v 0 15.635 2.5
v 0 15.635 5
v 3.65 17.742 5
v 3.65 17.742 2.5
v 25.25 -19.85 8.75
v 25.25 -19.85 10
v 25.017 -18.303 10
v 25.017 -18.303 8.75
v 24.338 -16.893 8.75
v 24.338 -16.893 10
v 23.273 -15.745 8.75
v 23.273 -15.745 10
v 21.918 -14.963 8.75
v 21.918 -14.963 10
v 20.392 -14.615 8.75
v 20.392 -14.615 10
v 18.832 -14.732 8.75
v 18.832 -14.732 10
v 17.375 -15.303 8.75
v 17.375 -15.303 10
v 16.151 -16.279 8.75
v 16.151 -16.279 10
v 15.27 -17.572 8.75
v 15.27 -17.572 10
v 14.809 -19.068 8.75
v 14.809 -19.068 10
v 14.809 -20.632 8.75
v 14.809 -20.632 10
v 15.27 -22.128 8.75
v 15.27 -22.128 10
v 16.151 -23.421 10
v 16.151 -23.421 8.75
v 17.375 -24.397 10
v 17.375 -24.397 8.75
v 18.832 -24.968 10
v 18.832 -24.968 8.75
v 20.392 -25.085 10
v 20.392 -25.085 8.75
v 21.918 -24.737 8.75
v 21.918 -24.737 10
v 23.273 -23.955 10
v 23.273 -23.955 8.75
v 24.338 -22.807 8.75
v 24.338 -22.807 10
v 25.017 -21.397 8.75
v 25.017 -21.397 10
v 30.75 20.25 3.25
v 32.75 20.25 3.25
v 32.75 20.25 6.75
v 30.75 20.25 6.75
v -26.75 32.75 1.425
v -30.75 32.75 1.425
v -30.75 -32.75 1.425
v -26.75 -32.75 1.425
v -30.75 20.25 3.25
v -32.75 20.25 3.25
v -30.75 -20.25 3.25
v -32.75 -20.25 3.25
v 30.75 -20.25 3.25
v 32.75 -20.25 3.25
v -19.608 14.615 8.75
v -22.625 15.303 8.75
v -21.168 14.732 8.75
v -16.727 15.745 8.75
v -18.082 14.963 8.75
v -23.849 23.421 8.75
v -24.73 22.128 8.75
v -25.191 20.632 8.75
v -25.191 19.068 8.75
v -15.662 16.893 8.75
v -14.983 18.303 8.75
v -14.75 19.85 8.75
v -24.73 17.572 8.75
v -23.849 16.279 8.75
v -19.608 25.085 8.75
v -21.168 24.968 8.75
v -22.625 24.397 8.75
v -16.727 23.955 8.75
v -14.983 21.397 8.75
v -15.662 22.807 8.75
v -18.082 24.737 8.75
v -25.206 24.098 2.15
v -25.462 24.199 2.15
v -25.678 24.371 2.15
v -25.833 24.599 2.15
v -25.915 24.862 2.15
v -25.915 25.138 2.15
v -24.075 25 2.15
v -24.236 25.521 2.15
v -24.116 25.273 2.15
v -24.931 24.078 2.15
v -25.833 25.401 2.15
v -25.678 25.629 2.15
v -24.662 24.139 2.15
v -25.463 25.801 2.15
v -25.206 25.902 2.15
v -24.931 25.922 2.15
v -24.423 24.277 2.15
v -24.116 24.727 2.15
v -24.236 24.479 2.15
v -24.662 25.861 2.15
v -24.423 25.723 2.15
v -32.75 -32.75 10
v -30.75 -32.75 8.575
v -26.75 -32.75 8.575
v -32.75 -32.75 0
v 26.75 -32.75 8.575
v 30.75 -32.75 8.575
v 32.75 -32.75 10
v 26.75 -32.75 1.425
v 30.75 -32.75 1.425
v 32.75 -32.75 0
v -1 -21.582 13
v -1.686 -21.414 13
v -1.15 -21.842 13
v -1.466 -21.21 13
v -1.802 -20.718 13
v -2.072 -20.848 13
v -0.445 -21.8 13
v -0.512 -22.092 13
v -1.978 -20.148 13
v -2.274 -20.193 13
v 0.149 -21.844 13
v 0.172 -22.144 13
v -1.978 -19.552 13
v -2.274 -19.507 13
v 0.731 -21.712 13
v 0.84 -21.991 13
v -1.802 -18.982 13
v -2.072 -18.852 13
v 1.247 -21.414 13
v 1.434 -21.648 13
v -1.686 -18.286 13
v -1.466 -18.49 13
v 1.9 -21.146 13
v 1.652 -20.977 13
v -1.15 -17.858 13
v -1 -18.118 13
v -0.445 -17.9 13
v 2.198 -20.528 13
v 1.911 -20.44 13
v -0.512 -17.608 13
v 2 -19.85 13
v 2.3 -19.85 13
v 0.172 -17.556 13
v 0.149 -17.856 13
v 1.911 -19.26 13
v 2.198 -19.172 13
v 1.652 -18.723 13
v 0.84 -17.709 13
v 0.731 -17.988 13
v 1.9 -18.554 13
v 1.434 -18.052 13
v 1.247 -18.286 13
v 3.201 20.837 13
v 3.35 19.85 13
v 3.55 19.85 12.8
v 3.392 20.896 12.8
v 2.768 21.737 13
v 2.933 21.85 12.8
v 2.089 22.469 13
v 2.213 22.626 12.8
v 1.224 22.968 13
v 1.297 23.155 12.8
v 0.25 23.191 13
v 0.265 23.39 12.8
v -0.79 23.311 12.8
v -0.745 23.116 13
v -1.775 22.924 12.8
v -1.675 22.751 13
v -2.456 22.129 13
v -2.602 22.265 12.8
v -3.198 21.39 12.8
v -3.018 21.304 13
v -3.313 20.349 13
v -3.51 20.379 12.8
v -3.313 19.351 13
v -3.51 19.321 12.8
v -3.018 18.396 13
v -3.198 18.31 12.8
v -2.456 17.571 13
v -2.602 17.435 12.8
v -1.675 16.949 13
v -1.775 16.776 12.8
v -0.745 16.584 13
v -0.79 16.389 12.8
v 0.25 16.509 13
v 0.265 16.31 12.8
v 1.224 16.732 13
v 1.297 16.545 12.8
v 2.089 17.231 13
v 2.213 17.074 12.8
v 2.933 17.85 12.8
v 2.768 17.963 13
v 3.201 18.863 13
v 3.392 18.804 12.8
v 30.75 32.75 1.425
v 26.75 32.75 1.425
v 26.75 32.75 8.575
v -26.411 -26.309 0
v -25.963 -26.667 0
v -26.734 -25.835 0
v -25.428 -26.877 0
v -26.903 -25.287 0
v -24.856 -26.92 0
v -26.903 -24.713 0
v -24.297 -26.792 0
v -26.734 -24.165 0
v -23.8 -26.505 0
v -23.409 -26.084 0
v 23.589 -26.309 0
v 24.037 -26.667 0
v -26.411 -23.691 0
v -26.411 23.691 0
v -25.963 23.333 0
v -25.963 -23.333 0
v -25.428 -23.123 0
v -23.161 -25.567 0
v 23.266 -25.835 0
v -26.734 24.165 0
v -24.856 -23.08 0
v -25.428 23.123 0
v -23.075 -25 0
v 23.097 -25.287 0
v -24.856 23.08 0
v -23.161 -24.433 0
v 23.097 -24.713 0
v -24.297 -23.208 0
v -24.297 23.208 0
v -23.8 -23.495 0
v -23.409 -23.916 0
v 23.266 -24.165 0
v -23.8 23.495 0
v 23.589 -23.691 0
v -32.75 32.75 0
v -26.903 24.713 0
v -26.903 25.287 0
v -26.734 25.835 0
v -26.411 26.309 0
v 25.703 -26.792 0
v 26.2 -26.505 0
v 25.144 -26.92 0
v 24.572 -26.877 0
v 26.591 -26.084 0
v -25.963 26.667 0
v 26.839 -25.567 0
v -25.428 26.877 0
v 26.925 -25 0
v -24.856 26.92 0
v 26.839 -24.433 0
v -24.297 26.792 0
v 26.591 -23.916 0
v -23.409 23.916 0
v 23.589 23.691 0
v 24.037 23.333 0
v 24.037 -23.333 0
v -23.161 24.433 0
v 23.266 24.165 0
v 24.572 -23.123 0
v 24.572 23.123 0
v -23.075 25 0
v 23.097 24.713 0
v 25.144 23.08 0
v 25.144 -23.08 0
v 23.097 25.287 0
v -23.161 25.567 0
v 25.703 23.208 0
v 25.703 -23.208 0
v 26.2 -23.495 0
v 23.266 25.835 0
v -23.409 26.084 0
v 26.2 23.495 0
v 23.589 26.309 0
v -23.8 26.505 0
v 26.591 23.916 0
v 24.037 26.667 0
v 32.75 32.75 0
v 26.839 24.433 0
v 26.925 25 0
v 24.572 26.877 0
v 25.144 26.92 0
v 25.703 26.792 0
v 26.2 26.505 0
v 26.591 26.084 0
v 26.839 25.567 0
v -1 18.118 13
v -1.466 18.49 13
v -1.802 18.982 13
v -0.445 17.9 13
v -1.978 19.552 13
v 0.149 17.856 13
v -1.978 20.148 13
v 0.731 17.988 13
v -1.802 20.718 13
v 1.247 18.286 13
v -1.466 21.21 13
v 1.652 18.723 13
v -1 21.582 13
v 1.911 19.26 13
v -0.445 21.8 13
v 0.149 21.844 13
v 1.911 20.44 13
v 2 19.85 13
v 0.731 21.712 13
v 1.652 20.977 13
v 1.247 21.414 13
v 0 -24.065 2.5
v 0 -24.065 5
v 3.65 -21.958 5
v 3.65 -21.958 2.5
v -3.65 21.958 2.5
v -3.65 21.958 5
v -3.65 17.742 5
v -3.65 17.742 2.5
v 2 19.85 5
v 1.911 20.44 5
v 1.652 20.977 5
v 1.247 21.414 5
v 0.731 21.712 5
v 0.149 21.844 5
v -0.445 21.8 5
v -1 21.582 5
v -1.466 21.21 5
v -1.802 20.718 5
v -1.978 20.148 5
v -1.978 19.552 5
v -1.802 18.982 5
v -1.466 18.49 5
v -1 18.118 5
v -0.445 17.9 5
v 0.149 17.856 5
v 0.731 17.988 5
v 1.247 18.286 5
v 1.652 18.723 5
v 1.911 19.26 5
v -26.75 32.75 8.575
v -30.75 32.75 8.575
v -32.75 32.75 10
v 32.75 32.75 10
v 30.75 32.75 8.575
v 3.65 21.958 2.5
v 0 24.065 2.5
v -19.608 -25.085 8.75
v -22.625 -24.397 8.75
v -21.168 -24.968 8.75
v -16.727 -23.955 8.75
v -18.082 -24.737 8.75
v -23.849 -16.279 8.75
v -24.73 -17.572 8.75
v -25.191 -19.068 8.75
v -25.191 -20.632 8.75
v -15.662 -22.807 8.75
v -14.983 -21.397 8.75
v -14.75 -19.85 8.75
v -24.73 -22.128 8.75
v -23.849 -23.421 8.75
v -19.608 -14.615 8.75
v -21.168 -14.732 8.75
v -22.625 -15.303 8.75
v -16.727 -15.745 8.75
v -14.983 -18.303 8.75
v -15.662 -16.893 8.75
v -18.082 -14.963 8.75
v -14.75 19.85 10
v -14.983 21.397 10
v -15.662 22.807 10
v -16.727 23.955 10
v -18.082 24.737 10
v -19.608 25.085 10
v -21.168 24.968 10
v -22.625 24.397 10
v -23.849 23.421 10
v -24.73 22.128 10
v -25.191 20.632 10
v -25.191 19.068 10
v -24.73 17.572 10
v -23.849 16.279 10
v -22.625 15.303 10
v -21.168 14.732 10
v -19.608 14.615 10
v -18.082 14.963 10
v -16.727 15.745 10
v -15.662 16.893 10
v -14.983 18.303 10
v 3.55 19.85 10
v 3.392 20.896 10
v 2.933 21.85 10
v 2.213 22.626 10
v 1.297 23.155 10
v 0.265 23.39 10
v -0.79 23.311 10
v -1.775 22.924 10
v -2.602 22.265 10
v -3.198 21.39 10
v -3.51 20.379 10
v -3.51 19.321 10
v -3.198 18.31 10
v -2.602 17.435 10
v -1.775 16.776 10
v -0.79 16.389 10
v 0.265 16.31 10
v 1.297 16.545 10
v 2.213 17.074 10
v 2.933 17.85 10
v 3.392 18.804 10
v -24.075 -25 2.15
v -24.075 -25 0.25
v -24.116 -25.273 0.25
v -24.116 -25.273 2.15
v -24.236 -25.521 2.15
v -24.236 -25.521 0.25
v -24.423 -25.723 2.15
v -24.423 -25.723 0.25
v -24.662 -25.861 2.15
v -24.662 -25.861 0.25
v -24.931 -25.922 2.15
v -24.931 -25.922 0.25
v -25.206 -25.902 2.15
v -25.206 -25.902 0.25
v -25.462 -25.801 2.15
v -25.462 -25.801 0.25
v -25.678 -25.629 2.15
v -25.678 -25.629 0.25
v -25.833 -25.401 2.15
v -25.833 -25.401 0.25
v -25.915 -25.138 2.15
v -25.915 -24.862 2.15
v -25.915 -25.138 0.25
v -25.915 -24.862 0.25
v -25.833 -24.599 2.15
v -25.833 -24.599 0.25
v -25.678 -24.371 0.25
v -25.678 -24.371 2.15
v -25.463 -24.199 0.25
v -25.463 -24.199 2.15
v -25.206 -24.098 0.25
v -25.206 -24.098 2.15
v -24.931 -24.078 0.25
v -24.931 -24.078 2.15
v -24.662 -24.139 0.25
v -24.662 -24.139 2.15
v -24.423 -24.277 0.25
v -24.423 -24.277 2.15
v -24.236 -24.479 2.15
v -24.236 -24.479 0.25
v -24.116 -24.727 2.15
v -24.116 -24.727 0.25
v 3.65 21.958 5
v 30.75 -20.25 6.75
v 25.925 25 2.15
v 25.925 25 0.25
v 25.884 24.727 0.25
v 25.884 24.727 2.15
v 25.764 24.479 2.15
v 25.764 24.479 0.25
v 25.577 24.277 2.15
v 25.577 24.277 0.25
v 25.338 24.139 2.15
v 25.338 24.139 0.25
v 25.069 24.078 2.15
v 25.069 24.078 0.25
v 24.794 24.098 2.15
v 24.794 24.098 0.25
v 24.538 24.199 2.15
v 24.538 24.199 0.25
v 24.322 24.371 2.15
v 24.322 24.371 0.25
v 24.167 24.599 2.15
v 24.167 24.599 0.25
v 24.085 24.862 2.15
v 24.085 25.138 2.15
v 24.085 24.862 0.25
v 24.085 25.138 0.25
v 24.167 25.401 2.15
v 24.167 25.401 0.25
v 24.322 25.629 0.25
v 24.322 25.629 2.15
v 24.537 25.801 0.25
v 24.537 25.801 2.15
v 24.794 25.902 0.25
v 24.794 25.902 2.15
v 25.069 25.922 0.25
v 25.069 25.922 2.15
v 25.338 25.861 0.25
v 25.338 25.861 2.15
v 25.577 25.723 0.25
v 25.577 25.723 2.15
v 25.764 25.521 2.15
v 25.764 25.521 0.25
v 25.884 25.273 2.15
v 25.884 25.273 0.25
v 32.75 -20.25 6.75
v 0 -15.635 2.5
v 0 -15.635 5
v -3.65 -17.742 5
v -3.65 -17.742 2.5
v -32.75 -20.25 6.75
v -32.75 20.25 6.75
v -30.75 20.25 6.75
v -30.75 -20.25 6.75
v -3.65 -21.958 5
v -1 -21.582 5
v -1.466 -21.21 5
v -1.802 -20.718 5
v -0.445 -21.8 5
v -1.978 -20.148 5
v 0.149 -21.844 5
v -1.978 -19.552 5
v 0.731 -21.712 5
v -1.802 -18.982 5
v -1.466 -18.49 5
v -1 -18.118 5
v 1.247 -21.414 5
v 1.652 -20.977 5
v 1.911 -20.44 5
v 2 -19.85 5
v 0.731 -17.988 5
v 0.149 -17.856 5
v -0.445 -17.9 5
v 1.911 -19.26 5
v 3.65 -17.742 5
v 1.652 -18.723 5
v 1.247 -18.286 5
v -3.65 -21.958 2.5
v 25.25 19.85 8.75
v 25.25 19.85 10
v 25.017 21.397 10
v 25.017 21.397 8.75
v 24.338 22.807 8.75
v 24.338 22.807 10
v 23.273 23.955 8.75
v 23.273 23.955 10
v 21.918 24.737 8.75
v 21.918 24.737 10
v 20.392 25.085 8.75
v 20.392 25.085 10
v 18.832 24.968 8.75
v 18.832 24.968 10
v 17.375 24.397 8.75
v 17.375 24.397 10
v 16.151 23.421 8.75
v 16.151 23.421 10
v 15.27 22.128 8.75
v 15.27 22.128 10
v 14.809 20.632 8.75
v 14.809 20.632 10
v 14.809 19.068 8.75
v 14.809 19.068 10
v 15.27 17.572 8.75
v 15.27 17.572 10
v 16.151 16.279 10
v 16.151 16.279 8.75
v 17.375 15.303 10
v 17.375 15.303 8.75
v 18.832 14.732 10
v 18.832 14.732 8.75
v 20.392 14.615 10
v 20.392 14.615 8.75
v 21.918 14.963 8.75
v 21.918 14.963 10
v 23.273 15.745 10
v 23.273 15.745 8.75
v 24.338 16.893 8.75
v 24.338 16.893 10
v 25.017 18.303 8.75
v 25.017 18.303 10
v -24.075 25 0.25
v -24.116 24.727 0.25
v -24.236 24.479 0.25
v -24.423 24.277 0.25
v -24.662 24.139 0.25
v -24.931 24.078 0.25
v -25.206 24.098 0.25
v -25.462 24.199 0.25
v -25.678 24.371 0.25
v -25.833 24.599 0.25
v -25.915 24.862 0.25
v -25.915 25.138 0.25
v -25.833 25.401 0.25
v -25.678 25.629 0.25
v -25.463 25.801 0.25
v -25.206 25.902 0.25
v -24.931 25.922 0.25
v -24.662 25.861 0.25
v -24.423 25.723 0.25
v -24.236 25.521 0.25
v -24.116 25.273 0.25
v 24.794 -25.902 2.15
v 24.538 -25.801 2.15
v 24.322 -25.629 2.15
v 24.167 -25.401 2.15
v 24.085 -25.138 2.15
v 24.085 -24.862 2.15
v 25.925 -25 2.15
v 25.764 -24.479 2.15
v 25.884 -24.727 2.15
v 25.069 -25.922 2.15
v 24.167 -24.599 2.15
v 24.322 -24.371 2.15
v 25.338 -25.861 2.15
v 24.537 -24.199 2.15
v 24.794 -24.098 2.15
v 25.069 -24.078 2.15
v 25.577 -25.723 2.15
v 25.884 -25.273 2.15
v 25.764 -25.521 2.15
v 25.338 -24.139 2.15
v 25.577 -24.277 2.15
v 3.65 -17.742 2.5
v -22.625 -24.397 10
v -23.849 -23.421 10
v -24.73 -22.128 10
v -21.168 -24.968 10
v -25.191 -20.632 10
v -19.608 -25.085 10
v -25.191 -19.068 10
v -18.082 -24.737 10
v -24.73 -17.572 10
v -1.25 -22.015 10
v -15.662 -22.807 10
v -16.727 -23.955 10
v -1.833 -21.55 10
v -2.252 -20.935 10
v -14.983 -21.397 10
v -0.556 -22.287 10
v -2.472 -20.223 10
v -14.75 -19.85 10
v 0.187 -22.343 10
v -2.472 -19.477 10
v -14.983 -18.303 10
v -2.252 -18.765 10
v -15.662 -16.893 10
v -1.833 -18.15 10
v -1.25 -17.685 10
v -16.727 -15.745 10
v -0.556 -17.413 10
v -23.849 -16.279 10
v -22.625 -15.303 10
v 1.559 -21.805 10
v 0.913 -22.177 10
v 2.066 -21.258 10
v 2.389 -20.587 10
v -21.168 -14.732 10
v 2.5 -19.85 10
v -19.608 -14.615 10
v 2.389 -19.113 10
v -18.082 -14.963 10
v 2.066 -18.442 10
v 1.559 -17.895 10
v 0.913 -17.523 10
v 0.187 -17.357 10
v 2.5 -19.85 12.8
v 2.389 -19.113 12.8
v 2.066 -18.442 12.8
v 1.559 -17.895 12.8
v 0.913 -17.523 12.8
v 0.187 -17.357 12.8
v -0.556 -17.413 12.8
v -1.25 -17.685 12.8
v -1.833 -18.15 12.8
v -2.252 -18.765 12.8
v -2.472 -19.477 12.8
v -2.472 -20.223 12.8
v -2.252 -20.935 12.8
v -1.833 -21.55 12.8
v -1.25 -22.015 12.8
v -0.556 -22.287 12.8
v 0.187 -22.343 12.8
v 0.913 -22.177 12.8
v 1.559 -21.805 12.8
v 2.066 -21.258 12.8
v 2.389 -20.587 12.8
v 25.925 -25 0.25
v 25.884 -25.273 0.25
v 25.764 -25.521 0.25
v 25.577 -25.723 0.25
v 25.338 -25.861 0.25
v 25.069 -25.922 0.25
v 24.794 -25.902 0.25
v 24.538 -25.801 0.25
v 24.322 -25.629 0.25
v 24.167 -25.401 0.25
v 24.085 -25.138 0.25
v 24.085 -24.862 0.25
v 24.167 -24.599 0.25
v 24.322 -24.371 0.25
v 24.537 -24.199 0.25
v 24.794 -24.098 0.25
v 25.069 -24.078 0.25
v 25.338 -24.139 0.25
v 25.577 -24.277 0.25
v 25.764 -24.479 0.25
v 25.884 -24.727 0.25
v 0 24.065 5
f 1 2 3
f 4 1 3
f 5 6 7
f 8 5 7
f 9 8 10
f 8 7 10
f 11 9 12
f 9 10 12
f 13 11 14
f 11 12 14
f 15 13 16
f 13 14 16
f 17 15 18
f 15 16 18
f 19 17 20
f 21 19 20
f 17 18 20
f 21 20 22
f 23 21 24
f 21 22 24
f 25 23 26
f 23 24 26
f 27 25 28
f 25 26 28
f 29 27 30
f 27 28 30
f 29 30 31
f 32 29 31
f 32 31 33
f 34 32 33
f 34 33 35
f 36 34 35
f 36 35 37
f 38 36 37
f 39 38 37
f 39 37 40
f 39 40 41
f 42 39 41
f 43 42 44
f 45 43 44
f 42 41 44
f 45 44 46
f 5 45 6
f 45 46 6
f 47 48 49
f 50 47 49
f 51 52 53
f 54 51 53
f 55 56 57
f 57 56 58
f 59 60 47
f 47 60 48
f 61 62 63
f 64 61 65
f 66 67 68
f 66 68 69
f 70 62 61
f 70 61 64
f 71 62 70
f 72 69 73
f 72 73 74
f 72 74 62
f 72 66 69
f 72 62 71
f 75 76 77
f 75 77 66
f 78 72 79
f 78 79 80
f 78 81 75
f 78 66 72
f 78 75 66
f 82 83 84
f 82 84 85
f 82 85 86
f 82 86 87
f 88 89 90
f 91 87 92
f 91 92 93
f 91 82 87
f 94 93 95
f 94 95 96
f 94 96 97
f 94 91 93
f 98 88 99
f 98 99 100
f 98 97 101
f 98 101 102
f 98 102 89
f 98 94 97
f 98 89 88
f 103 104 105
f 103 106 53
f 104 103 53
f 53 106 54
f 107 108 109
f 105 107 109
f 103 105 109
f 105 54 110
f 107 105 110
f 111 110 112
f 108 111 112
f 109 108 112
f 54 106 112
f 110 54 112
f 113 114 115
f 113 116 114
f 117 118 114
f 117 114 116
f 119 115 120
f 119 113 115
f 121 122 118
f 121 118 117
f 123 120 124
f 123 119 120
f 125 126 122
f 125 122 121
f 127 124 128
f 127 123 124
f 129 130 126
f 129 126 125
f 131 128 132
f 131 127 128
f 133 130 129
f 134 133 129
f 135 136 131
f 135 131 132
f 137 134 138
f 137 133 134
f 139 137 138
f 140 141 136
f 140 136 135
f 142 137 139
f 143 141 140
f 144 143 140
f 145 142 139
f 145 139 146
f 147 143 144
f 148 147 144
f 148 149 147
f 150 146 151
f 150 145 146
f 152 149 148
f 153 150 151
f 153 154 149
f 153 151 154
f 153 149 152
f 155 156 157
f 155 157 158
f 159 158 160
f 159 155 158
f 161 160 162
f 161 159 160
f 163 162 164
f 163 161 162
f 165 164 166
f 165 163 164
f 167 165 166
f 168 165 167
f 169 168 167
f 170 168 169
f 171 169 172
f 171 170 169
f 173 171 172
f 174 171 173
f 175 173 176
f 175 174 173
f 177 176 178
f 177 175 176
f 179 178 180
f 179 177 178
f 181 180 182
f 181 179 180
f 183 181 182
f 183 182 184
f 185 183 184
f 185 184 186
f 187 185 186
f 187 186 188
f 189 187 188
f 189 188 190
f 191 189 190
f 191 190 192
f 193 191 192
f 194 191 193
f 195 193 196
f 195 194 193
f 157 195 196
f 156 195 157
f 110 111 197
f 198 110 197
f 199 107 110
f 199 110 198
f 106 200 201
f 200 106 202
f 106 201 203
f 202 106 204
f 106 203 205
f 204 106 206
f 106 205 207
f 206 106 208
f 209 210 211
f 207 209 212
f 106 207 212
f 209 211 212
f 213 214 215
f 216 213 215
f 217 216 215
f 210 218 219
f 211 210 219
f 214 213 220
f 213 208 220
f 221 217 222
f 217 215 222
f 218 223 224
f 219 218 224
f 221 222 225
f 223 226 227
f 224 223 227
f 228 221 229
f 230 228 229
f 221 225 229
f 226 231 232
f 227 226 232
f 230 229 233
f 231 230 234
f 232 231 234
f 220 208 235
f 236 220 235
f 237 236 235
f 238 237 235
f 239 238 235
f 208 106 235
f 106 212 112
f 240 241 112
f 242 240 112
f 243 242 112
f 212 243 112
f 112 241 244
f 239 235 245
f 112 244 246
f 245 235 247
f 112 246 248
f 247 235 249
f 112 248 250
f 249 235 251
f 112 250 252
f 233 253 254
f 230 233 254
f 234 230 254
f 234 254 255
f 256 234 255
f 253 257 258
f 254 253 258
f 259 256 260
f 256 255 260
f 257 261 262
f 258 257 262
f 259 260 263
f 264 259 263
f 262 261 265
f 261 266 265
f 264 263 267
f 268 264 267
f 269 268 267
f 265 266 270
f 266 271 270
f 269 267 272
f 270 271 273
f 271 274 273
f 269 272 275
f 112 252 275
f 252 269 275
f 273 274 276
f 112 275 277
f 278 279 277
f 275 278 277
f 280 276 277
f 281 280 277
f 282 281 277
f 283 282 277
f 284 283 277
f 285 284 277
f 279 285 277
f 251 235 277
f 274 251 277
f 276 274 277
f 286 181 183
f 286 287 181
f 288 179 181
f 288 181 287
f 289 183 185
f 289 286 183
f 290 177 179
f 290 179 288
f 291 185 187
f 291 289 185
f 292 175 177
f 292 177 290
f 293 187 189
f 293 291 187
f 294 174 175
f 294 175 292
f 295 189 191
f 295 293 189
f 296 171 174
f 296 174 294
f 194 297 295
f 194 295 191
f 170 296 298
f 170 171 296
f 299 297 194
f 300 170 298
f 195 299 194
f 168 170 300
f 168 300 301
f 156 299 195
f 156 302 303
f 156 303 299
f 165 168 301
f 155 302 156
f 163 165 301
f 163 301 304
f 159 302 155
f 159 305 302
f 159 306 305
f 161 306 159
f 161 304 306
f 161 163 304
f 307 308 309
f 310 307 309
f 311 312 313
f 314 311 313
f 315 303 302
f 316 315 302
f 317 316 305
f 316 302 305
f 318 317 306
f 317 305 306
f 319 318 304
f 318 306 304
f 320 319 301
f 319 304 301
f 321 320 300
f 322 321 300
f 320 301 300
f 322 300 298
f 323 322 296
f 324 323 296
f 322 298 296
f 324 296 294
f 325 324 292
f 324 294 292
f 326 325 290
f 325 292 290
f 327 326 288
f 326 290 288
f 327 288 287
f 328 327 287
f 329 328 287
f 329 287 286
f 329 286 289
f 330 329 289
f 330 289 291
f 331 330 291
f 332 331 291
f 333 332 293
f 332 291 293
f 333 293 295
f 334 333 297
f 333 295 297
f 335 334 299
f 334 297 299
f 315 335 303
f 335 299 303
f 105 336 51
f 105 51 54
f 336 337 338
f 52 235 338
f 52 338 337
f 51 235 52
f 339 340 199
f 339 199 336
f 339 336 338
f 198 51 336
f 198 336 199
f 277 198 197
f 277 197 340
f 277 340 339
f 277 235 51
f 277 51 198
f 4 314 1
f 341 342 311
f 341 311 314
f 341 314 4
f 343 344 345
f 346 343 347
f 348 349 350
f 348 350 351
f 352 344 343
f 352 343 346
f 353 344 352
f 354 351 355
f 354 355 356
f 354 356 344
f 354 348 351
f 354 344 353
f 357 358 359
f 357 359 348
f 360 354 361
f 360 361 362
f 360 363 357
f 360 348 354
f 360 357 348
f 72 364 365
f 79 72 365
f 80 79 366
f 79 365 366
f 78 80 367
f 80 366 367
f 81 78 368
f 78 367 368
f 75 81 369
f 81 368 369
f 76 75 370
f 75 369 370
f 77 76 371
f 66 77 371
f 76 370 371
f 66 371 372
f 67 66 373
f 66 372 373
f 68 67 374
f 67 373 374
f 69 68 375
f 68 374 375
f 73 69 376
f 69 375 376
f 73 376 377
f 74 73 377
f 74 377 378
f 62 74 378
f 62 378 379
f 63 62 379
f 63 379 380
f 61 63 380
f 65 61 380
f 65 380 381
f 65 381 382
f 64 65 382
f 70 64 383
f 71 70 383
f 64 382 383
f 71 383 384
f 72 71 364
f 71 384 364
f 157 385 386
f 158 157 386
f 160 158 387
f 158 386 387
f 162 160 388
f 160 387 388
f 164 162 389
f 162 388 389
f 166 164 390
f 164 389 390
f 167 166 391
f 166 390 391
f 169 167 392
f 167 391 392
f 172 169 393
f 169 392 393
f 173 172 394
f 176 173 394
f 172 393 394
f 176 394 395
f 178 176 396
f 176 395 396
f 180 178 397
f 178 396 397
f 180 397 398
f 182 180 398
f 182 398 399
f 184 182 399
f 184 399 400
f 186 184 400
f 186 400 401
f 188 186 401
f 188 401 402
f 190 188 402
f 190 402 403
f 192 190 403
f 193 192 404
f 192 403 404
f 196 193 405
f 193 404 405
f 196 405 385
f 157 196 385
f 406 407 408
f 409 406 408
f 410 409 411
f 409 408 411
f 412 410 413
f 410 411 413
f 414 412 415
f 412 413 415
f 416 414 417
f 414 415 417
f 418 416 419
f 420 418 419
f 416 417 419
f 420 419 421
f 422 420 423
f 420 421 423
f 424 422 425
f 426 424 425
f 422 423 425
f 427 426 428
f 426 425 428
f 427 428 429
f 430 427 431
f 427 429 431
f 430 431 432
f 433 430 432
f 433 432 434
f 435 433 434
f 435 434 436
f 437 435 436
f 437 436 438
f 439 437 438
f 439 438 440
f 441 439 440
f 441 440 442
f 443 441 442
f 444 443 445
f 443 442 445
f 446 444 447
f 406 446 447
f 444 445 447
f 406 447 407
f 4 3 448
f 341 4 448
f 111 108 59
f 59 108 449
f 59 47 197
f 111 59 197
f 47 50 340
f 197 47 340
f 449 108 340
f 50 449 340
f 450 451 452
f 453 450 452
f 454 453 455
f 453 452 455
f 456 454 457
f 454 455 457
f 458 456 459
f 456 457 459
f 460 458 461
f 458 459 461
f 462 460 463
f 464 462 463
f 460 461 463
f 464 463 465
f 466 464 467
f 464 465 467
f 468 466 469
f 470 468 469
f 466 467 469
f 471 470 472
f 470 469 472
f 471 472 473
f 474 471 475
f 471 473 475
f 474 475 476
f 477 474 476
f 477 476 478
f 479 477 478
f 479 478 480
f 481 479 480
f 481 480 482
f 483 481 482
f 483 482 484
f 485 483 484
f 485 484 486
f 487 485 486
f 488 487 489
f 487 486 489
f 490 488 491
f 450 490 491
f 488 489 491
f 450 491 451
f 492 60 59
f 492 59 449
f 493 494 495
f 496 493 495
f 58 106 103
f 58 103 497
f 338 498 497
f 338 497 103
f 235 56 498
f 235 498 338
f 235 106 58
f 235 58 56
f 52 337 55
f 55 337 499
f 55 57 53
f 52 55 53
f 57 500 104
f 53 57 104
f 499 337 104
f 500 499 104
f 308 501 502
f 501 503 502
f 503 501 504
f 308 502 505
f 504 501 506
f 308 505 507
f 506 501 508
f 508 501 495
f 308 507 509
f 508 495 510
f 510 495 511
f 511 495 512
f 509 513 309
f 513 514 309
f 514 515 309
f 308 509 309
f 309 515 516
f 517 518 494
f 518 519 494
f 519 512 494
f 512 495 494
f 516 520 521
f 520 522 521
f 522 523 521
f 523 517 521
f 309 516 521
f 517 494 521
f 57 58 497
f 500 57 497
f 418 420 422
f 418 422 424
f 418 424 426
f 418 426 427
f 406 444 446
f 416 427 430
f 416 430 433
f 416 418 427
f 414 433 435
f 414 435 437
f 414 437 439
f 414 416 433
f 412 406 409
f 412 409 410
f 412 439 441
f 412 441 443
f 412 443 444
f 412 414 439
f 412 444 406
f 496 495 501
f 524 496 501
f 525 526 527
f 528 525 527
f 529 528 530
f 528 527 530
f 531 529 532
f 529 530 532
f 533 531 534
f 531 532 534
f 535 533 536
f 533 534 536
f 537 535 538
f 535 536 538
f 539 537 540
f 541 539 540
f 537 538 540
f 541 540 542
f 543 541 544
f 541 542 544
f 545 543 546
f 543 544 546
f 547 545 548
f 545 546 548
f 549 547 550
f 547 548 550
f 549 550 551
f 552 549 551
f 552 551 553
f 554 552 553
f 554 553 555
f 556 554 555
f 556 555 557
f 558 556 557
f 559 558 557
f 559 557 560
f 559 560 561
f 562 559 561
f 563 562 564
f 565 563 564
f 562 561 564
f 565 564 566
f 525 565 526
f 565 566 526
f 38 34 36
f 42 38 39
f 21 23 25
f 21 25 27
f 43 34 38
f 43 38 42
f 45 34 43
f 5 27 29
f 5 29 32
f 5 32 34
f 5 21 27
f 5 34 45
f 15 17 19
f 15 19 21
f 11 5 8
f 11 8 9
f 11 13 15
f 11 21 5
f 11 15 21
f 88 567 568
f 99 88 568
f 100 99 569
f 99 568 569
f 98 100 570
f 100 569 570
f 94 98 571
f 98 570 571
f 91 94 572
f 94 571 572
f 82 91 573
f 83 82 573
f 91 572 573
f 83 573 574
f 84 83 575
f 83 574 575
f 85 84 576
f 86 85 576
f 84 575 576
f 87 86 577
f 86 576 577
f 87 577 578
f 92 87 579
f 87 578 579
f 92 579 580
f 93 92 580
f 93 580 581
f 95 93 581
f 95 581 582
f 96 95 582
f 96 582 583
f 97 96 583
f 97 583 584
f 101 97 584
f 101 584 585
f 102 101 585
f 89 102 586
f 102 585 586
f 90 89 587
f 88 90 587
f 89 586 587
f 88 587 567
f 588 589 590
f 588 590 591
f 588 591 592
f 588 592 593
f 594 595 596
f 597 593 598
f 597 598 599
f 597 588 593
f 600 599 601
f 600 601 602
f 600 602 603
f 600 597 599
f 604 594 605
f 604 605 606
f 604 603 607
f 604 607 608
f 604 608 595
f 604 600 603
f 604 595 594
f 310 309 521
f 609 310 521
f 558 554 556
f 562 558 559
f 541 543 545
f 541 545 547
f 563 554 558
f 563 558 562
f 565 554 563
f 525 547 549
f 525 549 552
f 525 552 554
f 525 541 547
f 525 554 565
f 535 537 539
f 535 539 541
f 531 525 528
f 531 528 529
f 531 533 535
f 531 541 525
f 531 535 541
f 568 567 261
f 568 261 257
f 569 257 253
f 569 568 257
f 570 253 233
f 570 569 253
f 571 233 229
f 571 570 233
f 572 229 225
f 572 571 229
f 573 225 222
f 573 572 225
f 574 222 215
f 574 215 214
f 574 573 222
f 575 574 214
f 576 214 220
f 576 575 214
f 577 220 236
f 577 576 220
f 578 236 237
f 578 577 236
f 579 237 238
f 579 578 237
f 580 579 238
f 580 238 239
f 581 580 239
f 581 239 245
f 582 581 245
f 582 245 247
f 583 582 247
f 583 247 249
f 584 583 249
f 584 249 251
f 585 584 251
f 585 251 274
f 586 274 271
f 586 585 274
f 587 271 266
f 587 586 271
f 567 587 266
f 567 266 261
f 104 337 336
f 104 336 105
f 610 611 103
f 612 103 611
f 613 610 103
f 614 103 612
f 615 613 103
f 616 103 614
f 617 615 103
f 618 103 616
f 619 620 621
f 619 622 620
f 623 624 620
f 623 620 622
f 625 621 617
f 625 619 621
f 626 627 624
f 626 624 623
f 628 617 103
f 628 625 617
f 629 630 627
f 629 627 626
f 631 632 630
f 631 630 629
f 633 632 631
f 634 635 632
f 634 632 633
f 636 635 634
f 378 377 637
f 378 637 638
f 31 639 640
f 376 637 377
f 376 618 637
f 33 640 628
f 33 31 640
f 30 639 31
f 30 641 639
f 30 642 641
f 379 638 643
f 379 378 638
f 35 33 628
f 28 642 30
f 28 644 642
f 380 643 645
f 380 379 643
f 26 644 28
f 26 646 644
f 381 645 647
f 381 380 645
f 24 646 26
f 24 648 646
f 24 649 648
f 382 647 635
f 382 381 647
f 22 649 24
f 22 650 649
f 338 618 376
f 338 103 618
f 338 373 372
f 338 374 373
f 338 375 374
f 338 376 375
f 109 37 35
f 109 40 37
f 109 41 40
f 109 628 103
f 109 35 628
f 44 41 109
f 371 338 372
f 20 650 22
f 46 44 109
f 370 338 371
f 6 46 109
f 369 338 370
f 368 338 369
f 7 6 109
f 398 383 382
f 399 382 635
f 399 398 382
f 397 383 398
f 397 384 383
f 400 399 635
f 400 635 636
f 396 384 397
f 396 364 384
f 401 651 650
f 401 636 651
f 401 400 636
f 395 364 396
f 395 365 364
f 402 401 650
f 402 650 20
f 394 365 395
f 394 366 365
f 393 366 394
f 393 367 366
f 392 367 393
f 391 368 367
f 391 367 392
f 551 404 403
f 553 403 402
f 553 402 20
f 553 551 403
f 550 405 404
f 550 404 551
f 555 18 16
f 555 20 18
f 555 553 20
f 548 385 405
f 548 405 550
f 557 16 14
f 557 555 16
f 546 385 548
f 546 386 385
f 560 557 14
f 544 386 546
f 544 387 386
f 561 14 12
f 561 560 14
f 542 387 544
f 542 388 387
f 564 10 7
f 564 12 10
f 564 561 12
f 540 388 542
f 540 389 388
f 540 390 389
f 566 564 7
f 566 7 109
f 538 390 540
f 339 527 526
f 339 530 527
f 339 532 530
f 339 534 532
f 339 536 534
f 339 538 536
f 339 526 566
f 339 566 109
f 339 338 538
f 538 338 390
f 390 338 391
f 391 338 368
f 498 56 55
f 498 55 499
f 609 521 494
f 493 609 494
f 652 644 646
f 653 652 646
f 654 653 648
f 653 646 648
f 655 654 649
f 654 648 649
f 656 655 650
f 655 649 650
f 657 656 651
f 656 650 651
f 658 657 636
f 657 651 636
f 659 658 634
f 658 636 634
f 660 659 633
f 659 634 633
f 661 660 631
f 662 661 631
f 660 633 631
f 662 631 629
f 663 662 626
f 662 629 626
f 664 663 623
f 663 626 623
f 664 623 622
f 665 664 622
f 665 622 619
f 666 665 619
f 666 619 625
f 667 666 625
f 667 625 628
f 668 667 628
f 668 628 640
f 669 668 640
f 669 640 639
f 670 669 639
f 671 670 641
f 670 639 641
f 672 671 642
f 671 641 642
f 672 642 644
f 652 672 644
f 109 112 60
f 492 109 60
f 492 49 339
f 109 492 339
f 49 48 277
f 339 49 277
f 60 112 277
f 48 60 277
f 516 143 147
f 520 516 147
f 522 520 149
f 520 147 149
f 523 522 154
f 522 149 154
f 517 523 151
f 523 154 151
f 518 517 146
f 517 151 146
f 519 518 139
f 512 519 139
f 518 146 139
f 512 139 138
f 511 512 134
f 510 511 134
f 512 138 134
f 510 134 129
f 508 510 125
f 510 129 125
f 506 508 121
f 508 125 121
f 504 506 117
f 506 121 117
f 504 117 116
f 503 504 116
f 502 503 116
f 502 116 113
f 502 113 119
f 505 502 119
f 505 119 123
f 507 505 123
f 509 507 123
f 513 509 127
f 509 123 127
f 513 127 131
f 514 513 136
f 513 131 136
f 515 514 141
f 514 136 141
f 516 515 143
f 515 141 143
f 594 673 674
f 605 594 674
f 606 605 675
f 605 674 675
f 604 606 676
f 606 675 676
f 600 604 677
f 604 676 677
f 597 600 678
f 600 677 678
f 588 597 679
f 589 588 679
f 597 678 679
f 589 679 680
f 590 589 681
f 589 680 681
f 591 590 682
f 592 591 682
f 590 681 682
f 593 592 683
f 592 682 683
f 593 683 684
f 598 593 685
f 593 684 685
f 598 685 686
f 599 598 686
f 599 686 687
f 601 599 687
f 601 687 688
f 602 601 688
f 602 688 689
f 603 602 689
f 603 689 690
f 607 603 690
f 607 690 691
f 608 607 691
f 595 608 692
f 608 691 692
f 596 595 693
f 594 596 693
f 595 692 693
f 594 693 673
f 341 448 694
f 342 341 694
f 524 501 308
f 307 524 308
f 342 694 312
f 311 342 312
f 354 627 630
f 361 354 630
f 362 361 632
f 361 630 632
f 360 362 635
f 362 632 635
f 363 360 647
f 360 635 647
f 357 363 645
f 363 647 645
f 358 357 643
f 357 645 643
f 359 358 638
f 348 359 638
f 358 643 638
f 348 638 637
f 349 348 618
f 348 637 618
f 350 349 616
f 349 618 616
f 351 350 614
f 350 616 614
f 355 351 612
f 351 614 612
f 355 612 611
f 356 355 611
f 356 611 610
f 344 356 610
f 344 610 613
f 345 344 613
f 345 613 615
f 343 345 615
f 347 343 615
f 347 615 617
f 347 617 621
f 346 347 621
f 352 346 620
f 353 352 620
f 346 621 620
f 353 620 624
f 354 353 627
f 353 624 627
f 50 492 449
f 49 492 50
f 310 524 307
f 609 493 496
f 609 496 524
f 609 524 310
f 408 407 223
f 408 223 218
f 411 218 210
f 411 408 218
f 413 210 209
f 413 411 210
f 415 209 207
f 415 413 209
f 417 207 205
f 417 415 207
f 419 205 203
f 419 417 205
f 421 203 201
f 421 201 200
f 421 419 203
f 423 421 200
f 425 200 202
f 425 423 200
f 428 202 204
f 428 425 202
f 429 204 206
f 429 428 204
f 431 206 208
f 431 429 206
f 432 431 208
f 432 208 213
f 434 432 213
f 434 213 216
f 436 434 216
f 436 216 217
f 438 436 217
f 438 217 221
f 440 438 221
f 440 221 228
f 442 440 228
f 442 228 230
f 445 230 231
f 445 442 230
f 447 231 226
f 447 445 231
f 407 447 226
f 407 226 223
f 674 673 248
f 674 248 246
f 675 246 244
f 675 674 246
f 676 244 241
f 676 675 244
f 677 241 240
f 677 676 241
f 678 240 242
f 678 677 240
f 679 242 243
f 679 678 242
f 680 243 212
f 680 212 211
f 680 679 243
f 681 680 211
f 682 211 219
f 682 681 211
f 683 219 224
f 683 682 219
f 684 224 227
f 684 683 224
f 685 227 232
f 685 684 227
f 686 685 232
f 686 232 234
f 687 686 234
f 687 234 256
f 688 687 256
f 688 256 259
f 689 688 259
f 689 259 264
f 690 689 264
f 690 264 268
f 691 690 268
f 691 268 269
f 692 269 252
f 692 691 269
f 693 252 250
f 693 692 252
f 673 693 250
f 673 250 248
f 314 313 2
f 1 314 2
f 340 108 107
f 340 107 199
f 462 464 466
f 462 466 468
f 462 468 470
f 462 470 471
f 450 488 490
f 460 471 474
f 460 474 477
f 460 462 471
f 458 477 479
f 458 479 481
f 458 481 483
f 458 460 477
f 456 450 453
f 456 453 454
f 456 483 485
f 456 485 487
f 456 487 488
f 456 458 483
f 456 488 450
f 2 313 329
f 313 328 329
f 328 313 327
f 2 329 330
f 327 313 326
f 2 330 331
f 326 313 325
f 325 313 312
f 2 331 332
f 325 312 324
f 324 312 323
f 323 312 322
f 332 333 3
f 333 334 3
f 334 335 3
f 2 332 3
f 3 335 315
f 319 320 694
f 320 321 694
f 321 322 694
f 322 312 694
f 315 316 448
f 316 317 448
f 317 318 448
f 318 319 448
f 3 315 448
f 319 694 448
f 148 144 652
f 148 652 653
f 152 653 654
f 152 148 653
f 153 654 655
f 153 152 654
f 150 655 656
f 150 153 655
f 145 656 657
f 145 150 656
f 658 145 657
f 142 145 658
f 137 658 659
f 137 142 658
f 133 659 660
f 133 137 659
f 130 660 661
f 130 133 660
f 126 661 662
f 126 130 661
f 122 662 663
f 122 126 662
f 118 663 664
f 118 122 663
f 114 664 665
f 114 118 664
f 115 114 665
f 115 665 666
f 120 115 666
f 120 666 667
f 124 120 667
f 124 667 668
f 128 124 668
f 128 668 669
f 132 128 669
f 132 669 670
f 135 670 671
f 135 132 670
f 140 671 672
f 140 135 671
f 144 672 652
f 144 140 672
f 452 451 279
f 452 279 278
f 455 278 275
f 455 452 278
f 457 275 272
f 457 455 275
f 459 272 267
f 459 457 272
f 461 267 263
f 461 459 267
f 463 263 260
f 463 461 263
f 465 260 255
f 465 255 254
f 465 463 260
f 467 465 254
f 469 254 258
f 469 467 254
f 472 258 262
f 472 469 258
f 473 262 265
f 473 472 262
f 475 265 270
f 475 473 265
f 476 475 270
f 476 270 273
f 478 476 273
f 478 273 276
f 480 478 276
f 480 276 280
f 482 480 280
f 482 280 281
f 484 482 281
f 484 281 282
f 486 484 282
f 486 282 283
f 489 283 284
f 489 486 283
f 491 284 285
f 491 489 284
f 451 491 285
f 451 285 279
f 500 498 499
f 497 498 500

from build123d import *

# Parameters (mm, degrees)
SKETCH_W         = 65.5
SKETCH_H         = 65.5
PAD_DEPTH        = 10
SKETCH001_R      = 3.55
SKETCH001_R_2    = 2.5
PAD001_DEPTH     = 3
SKETCH002_R      = 2
POCKET_DEPTH     = 8
CHAMFER_SIZE     = 0.2
POCKET001_DEPTH  = 2.5
SKETCH004_W      = 40.5
SKETCH004_H      = 3.5
POCKET002_DEPTH  = 2
SKETCH005_W      = 40.5
SKETCH005_H      = 3.5
POCKET003_DEPTH  = 2
SKETCH006_W      = 65.5
SKETCH006_H      = 7.15
POCKET004_DEPTH  = 4
SKETCH007_W      = 65.5
SKETCH007_H      = 7.15
POCKET005_DEPTH  = 4
SKETCH008_R      = 0.925
POCKET006_DEPTH  = 2.15
CHAMFER001_SIZE2 = 0.25
CHAMFER001_SIZE  = 1
SKETCH009_R      = 5.25
POCKET007_DEPTH  = 1.25


with BuildPart() as part:
    # Sketch → Pad (new body)
    with BuildSketch(Plane.XY):
        Rectangle(SKETCH_W, SKETCH_H)
    extrude(amount=PAD_DEPTH)

    # Sketch001 (on Face6 of Pad) → Pad001 (join)
    with BuildSketch(Plane.XY.offset(10)):
        with Locations((0, 19.85)):
            Circle(SKETCH001_R)
        with Locations((0, -19.85)):
            Circle(SKETCH001_R_2)
    extrude(amount=PAD001_DEPTH)

    # Sketch002 (on Face10 of Pad001) → Pocket (cut)
    with BuildSketch(Plane.XY.offset(13)):
        with Locations((0, 19.85)):
            Circle(SKETCH002_R)
        with Locations((0, -19.85)):
            Circle(SKETCH002_R)
    extrude(amount=-POCKET_DEPTH, mode=Mode.SUBTRACT)

    # Chamfer
    chamfer_edges = [part.edges().sort_by_distance(p)[0] for p in [
        (-3.55, 19.85, 13),
        (-2.5, -19.85, 13),
    ]]
    chamfer(chamfer_edges, length=CHAMFER_SIZE)

    # Sketch003 (on DatumPlane) → Pocket001 (cut)
    with BuildSketch(Plane.XY.offset(5)):
        Polygon((-3.650297, 17.7425), (0, 15.635), (3.650297, 17.7425), (3.650297, 21.9575), (0, 24.065), (-3.650297, 21.9575), align=None)
        Polygon((-3.650297, -21.9575), (0, -24.065), (3.650297, -21.9575), (3.650297, -17.7425), (0, -15.635), (-3.650297, -17.7425), align=None)
    extrude(amount=-POCKET001_DEPTH, mode=Mode.SUBTRACT)

    # Sketch004 (on Face7 of Pocket001) → Pocket002 (cut)
    with BuildSketch(Plane.YZ.offset(32.75)):
        with Locations((0, 5)):
            Rectangle(SKETCH004_W, SKETCH004_H)
    extrude(amount=-POCKET002_DEPTH, mode=Mode.SUBTRACT)

    # Sketch005 (on Face6 of Pocket002) → Pocket003 (cut)
    with BuildSketch(Plane(origin=(-32.75, 0, 0), x_dir=(0, -1, 0), z_dir=(-1, 0, 0))):
        with Locations((0, 5)):
            Rectangle(SKETCH005_W, SKETCH005_H)
    extrude(amount=-POCKET003_DEPTH, mode=Mode.SUBTRACT)

    # Sketch006 (on DatumPlane) → Pocket004 (cut)
    with BuildSketch(Plane.YZ.offset(30.75)):
        with Locations((0, 5)):
            Rectangle(SKETCH006_W, SKETCH006_H)
    extrude(amount=-POCKET004_DEPTH, mode=Mode.SUBTRACT)

    # Sketch007 (on DatumPlane) → Pocket005 (cut)
    with BuildSketch(Plane(origin=(-30.75, 0, 0), x_dir=(0, -1, 0), z_dir=(-1, 0, 0))):
        with Locations((0, 5)):
            Rectangle(SKETCH007_W, SKETCH007_H)
    extrude(amount=-POCKET005_DEPTH, mode=Mode.SUBTRACT)

    # Sketch008 (on Face11 of Pocket005) → Pocket006 (cut)
    with BuildSketch(Plane(origin=(0, 0, 0), x_dir=(1, 0, 0), z_dir=(0, 0, -1))):
        with Locations((-25, 25)):
            Circle(SKETCH008_R)
        with Locations((25, 25)):
            Circle(SKETCH008_R)
        with Locations((-25, -25)):
            Circle(SKETCH008_R)
        with Locations((25, -25)):
            Circle(SKETCH008_R)
    extrude(amount=-POCKET006_DEPTH, mode=Mode.SUBTRACT)

    # Chamfer001
    chamfer001_edges = [part.edges().sort_by_distance(p)[0] for p in [
        (-25.925, -25, 0),
        (24.075, -25, 0),
        (-25.925, 25, 0),
        (24.075, 25, 0),
    ]]
    chamfer001_side = part.faces().sort_by_distance((0, 0, 0))[0]
    chamfer(chamfer001_edges, length=CHAMFER001_SIZE, length2=CHAMFER001_SIZE2, reference=chamfer001_side)

    # Sketch009 (on Face11 of Chamfer001) → Pocket007 (cut)
    with BuildSketch(Plane.XY.offset(10)):
        with Locations((-20, 19.85)):
            Circle(SKETCH009_R)
        with Locations((20, 19.85)):
            Circle(SKETCH009_R)
        with Locations((20, -19.85)):
            Circle(SKETCH009_R)
        with Locations((-20, -19.85)):
            Circle(SKETCH009_R)
    extrude(amount=-POCKET007_DEPTH, mode=Mode.SUBTRACT)


solid = part.part
